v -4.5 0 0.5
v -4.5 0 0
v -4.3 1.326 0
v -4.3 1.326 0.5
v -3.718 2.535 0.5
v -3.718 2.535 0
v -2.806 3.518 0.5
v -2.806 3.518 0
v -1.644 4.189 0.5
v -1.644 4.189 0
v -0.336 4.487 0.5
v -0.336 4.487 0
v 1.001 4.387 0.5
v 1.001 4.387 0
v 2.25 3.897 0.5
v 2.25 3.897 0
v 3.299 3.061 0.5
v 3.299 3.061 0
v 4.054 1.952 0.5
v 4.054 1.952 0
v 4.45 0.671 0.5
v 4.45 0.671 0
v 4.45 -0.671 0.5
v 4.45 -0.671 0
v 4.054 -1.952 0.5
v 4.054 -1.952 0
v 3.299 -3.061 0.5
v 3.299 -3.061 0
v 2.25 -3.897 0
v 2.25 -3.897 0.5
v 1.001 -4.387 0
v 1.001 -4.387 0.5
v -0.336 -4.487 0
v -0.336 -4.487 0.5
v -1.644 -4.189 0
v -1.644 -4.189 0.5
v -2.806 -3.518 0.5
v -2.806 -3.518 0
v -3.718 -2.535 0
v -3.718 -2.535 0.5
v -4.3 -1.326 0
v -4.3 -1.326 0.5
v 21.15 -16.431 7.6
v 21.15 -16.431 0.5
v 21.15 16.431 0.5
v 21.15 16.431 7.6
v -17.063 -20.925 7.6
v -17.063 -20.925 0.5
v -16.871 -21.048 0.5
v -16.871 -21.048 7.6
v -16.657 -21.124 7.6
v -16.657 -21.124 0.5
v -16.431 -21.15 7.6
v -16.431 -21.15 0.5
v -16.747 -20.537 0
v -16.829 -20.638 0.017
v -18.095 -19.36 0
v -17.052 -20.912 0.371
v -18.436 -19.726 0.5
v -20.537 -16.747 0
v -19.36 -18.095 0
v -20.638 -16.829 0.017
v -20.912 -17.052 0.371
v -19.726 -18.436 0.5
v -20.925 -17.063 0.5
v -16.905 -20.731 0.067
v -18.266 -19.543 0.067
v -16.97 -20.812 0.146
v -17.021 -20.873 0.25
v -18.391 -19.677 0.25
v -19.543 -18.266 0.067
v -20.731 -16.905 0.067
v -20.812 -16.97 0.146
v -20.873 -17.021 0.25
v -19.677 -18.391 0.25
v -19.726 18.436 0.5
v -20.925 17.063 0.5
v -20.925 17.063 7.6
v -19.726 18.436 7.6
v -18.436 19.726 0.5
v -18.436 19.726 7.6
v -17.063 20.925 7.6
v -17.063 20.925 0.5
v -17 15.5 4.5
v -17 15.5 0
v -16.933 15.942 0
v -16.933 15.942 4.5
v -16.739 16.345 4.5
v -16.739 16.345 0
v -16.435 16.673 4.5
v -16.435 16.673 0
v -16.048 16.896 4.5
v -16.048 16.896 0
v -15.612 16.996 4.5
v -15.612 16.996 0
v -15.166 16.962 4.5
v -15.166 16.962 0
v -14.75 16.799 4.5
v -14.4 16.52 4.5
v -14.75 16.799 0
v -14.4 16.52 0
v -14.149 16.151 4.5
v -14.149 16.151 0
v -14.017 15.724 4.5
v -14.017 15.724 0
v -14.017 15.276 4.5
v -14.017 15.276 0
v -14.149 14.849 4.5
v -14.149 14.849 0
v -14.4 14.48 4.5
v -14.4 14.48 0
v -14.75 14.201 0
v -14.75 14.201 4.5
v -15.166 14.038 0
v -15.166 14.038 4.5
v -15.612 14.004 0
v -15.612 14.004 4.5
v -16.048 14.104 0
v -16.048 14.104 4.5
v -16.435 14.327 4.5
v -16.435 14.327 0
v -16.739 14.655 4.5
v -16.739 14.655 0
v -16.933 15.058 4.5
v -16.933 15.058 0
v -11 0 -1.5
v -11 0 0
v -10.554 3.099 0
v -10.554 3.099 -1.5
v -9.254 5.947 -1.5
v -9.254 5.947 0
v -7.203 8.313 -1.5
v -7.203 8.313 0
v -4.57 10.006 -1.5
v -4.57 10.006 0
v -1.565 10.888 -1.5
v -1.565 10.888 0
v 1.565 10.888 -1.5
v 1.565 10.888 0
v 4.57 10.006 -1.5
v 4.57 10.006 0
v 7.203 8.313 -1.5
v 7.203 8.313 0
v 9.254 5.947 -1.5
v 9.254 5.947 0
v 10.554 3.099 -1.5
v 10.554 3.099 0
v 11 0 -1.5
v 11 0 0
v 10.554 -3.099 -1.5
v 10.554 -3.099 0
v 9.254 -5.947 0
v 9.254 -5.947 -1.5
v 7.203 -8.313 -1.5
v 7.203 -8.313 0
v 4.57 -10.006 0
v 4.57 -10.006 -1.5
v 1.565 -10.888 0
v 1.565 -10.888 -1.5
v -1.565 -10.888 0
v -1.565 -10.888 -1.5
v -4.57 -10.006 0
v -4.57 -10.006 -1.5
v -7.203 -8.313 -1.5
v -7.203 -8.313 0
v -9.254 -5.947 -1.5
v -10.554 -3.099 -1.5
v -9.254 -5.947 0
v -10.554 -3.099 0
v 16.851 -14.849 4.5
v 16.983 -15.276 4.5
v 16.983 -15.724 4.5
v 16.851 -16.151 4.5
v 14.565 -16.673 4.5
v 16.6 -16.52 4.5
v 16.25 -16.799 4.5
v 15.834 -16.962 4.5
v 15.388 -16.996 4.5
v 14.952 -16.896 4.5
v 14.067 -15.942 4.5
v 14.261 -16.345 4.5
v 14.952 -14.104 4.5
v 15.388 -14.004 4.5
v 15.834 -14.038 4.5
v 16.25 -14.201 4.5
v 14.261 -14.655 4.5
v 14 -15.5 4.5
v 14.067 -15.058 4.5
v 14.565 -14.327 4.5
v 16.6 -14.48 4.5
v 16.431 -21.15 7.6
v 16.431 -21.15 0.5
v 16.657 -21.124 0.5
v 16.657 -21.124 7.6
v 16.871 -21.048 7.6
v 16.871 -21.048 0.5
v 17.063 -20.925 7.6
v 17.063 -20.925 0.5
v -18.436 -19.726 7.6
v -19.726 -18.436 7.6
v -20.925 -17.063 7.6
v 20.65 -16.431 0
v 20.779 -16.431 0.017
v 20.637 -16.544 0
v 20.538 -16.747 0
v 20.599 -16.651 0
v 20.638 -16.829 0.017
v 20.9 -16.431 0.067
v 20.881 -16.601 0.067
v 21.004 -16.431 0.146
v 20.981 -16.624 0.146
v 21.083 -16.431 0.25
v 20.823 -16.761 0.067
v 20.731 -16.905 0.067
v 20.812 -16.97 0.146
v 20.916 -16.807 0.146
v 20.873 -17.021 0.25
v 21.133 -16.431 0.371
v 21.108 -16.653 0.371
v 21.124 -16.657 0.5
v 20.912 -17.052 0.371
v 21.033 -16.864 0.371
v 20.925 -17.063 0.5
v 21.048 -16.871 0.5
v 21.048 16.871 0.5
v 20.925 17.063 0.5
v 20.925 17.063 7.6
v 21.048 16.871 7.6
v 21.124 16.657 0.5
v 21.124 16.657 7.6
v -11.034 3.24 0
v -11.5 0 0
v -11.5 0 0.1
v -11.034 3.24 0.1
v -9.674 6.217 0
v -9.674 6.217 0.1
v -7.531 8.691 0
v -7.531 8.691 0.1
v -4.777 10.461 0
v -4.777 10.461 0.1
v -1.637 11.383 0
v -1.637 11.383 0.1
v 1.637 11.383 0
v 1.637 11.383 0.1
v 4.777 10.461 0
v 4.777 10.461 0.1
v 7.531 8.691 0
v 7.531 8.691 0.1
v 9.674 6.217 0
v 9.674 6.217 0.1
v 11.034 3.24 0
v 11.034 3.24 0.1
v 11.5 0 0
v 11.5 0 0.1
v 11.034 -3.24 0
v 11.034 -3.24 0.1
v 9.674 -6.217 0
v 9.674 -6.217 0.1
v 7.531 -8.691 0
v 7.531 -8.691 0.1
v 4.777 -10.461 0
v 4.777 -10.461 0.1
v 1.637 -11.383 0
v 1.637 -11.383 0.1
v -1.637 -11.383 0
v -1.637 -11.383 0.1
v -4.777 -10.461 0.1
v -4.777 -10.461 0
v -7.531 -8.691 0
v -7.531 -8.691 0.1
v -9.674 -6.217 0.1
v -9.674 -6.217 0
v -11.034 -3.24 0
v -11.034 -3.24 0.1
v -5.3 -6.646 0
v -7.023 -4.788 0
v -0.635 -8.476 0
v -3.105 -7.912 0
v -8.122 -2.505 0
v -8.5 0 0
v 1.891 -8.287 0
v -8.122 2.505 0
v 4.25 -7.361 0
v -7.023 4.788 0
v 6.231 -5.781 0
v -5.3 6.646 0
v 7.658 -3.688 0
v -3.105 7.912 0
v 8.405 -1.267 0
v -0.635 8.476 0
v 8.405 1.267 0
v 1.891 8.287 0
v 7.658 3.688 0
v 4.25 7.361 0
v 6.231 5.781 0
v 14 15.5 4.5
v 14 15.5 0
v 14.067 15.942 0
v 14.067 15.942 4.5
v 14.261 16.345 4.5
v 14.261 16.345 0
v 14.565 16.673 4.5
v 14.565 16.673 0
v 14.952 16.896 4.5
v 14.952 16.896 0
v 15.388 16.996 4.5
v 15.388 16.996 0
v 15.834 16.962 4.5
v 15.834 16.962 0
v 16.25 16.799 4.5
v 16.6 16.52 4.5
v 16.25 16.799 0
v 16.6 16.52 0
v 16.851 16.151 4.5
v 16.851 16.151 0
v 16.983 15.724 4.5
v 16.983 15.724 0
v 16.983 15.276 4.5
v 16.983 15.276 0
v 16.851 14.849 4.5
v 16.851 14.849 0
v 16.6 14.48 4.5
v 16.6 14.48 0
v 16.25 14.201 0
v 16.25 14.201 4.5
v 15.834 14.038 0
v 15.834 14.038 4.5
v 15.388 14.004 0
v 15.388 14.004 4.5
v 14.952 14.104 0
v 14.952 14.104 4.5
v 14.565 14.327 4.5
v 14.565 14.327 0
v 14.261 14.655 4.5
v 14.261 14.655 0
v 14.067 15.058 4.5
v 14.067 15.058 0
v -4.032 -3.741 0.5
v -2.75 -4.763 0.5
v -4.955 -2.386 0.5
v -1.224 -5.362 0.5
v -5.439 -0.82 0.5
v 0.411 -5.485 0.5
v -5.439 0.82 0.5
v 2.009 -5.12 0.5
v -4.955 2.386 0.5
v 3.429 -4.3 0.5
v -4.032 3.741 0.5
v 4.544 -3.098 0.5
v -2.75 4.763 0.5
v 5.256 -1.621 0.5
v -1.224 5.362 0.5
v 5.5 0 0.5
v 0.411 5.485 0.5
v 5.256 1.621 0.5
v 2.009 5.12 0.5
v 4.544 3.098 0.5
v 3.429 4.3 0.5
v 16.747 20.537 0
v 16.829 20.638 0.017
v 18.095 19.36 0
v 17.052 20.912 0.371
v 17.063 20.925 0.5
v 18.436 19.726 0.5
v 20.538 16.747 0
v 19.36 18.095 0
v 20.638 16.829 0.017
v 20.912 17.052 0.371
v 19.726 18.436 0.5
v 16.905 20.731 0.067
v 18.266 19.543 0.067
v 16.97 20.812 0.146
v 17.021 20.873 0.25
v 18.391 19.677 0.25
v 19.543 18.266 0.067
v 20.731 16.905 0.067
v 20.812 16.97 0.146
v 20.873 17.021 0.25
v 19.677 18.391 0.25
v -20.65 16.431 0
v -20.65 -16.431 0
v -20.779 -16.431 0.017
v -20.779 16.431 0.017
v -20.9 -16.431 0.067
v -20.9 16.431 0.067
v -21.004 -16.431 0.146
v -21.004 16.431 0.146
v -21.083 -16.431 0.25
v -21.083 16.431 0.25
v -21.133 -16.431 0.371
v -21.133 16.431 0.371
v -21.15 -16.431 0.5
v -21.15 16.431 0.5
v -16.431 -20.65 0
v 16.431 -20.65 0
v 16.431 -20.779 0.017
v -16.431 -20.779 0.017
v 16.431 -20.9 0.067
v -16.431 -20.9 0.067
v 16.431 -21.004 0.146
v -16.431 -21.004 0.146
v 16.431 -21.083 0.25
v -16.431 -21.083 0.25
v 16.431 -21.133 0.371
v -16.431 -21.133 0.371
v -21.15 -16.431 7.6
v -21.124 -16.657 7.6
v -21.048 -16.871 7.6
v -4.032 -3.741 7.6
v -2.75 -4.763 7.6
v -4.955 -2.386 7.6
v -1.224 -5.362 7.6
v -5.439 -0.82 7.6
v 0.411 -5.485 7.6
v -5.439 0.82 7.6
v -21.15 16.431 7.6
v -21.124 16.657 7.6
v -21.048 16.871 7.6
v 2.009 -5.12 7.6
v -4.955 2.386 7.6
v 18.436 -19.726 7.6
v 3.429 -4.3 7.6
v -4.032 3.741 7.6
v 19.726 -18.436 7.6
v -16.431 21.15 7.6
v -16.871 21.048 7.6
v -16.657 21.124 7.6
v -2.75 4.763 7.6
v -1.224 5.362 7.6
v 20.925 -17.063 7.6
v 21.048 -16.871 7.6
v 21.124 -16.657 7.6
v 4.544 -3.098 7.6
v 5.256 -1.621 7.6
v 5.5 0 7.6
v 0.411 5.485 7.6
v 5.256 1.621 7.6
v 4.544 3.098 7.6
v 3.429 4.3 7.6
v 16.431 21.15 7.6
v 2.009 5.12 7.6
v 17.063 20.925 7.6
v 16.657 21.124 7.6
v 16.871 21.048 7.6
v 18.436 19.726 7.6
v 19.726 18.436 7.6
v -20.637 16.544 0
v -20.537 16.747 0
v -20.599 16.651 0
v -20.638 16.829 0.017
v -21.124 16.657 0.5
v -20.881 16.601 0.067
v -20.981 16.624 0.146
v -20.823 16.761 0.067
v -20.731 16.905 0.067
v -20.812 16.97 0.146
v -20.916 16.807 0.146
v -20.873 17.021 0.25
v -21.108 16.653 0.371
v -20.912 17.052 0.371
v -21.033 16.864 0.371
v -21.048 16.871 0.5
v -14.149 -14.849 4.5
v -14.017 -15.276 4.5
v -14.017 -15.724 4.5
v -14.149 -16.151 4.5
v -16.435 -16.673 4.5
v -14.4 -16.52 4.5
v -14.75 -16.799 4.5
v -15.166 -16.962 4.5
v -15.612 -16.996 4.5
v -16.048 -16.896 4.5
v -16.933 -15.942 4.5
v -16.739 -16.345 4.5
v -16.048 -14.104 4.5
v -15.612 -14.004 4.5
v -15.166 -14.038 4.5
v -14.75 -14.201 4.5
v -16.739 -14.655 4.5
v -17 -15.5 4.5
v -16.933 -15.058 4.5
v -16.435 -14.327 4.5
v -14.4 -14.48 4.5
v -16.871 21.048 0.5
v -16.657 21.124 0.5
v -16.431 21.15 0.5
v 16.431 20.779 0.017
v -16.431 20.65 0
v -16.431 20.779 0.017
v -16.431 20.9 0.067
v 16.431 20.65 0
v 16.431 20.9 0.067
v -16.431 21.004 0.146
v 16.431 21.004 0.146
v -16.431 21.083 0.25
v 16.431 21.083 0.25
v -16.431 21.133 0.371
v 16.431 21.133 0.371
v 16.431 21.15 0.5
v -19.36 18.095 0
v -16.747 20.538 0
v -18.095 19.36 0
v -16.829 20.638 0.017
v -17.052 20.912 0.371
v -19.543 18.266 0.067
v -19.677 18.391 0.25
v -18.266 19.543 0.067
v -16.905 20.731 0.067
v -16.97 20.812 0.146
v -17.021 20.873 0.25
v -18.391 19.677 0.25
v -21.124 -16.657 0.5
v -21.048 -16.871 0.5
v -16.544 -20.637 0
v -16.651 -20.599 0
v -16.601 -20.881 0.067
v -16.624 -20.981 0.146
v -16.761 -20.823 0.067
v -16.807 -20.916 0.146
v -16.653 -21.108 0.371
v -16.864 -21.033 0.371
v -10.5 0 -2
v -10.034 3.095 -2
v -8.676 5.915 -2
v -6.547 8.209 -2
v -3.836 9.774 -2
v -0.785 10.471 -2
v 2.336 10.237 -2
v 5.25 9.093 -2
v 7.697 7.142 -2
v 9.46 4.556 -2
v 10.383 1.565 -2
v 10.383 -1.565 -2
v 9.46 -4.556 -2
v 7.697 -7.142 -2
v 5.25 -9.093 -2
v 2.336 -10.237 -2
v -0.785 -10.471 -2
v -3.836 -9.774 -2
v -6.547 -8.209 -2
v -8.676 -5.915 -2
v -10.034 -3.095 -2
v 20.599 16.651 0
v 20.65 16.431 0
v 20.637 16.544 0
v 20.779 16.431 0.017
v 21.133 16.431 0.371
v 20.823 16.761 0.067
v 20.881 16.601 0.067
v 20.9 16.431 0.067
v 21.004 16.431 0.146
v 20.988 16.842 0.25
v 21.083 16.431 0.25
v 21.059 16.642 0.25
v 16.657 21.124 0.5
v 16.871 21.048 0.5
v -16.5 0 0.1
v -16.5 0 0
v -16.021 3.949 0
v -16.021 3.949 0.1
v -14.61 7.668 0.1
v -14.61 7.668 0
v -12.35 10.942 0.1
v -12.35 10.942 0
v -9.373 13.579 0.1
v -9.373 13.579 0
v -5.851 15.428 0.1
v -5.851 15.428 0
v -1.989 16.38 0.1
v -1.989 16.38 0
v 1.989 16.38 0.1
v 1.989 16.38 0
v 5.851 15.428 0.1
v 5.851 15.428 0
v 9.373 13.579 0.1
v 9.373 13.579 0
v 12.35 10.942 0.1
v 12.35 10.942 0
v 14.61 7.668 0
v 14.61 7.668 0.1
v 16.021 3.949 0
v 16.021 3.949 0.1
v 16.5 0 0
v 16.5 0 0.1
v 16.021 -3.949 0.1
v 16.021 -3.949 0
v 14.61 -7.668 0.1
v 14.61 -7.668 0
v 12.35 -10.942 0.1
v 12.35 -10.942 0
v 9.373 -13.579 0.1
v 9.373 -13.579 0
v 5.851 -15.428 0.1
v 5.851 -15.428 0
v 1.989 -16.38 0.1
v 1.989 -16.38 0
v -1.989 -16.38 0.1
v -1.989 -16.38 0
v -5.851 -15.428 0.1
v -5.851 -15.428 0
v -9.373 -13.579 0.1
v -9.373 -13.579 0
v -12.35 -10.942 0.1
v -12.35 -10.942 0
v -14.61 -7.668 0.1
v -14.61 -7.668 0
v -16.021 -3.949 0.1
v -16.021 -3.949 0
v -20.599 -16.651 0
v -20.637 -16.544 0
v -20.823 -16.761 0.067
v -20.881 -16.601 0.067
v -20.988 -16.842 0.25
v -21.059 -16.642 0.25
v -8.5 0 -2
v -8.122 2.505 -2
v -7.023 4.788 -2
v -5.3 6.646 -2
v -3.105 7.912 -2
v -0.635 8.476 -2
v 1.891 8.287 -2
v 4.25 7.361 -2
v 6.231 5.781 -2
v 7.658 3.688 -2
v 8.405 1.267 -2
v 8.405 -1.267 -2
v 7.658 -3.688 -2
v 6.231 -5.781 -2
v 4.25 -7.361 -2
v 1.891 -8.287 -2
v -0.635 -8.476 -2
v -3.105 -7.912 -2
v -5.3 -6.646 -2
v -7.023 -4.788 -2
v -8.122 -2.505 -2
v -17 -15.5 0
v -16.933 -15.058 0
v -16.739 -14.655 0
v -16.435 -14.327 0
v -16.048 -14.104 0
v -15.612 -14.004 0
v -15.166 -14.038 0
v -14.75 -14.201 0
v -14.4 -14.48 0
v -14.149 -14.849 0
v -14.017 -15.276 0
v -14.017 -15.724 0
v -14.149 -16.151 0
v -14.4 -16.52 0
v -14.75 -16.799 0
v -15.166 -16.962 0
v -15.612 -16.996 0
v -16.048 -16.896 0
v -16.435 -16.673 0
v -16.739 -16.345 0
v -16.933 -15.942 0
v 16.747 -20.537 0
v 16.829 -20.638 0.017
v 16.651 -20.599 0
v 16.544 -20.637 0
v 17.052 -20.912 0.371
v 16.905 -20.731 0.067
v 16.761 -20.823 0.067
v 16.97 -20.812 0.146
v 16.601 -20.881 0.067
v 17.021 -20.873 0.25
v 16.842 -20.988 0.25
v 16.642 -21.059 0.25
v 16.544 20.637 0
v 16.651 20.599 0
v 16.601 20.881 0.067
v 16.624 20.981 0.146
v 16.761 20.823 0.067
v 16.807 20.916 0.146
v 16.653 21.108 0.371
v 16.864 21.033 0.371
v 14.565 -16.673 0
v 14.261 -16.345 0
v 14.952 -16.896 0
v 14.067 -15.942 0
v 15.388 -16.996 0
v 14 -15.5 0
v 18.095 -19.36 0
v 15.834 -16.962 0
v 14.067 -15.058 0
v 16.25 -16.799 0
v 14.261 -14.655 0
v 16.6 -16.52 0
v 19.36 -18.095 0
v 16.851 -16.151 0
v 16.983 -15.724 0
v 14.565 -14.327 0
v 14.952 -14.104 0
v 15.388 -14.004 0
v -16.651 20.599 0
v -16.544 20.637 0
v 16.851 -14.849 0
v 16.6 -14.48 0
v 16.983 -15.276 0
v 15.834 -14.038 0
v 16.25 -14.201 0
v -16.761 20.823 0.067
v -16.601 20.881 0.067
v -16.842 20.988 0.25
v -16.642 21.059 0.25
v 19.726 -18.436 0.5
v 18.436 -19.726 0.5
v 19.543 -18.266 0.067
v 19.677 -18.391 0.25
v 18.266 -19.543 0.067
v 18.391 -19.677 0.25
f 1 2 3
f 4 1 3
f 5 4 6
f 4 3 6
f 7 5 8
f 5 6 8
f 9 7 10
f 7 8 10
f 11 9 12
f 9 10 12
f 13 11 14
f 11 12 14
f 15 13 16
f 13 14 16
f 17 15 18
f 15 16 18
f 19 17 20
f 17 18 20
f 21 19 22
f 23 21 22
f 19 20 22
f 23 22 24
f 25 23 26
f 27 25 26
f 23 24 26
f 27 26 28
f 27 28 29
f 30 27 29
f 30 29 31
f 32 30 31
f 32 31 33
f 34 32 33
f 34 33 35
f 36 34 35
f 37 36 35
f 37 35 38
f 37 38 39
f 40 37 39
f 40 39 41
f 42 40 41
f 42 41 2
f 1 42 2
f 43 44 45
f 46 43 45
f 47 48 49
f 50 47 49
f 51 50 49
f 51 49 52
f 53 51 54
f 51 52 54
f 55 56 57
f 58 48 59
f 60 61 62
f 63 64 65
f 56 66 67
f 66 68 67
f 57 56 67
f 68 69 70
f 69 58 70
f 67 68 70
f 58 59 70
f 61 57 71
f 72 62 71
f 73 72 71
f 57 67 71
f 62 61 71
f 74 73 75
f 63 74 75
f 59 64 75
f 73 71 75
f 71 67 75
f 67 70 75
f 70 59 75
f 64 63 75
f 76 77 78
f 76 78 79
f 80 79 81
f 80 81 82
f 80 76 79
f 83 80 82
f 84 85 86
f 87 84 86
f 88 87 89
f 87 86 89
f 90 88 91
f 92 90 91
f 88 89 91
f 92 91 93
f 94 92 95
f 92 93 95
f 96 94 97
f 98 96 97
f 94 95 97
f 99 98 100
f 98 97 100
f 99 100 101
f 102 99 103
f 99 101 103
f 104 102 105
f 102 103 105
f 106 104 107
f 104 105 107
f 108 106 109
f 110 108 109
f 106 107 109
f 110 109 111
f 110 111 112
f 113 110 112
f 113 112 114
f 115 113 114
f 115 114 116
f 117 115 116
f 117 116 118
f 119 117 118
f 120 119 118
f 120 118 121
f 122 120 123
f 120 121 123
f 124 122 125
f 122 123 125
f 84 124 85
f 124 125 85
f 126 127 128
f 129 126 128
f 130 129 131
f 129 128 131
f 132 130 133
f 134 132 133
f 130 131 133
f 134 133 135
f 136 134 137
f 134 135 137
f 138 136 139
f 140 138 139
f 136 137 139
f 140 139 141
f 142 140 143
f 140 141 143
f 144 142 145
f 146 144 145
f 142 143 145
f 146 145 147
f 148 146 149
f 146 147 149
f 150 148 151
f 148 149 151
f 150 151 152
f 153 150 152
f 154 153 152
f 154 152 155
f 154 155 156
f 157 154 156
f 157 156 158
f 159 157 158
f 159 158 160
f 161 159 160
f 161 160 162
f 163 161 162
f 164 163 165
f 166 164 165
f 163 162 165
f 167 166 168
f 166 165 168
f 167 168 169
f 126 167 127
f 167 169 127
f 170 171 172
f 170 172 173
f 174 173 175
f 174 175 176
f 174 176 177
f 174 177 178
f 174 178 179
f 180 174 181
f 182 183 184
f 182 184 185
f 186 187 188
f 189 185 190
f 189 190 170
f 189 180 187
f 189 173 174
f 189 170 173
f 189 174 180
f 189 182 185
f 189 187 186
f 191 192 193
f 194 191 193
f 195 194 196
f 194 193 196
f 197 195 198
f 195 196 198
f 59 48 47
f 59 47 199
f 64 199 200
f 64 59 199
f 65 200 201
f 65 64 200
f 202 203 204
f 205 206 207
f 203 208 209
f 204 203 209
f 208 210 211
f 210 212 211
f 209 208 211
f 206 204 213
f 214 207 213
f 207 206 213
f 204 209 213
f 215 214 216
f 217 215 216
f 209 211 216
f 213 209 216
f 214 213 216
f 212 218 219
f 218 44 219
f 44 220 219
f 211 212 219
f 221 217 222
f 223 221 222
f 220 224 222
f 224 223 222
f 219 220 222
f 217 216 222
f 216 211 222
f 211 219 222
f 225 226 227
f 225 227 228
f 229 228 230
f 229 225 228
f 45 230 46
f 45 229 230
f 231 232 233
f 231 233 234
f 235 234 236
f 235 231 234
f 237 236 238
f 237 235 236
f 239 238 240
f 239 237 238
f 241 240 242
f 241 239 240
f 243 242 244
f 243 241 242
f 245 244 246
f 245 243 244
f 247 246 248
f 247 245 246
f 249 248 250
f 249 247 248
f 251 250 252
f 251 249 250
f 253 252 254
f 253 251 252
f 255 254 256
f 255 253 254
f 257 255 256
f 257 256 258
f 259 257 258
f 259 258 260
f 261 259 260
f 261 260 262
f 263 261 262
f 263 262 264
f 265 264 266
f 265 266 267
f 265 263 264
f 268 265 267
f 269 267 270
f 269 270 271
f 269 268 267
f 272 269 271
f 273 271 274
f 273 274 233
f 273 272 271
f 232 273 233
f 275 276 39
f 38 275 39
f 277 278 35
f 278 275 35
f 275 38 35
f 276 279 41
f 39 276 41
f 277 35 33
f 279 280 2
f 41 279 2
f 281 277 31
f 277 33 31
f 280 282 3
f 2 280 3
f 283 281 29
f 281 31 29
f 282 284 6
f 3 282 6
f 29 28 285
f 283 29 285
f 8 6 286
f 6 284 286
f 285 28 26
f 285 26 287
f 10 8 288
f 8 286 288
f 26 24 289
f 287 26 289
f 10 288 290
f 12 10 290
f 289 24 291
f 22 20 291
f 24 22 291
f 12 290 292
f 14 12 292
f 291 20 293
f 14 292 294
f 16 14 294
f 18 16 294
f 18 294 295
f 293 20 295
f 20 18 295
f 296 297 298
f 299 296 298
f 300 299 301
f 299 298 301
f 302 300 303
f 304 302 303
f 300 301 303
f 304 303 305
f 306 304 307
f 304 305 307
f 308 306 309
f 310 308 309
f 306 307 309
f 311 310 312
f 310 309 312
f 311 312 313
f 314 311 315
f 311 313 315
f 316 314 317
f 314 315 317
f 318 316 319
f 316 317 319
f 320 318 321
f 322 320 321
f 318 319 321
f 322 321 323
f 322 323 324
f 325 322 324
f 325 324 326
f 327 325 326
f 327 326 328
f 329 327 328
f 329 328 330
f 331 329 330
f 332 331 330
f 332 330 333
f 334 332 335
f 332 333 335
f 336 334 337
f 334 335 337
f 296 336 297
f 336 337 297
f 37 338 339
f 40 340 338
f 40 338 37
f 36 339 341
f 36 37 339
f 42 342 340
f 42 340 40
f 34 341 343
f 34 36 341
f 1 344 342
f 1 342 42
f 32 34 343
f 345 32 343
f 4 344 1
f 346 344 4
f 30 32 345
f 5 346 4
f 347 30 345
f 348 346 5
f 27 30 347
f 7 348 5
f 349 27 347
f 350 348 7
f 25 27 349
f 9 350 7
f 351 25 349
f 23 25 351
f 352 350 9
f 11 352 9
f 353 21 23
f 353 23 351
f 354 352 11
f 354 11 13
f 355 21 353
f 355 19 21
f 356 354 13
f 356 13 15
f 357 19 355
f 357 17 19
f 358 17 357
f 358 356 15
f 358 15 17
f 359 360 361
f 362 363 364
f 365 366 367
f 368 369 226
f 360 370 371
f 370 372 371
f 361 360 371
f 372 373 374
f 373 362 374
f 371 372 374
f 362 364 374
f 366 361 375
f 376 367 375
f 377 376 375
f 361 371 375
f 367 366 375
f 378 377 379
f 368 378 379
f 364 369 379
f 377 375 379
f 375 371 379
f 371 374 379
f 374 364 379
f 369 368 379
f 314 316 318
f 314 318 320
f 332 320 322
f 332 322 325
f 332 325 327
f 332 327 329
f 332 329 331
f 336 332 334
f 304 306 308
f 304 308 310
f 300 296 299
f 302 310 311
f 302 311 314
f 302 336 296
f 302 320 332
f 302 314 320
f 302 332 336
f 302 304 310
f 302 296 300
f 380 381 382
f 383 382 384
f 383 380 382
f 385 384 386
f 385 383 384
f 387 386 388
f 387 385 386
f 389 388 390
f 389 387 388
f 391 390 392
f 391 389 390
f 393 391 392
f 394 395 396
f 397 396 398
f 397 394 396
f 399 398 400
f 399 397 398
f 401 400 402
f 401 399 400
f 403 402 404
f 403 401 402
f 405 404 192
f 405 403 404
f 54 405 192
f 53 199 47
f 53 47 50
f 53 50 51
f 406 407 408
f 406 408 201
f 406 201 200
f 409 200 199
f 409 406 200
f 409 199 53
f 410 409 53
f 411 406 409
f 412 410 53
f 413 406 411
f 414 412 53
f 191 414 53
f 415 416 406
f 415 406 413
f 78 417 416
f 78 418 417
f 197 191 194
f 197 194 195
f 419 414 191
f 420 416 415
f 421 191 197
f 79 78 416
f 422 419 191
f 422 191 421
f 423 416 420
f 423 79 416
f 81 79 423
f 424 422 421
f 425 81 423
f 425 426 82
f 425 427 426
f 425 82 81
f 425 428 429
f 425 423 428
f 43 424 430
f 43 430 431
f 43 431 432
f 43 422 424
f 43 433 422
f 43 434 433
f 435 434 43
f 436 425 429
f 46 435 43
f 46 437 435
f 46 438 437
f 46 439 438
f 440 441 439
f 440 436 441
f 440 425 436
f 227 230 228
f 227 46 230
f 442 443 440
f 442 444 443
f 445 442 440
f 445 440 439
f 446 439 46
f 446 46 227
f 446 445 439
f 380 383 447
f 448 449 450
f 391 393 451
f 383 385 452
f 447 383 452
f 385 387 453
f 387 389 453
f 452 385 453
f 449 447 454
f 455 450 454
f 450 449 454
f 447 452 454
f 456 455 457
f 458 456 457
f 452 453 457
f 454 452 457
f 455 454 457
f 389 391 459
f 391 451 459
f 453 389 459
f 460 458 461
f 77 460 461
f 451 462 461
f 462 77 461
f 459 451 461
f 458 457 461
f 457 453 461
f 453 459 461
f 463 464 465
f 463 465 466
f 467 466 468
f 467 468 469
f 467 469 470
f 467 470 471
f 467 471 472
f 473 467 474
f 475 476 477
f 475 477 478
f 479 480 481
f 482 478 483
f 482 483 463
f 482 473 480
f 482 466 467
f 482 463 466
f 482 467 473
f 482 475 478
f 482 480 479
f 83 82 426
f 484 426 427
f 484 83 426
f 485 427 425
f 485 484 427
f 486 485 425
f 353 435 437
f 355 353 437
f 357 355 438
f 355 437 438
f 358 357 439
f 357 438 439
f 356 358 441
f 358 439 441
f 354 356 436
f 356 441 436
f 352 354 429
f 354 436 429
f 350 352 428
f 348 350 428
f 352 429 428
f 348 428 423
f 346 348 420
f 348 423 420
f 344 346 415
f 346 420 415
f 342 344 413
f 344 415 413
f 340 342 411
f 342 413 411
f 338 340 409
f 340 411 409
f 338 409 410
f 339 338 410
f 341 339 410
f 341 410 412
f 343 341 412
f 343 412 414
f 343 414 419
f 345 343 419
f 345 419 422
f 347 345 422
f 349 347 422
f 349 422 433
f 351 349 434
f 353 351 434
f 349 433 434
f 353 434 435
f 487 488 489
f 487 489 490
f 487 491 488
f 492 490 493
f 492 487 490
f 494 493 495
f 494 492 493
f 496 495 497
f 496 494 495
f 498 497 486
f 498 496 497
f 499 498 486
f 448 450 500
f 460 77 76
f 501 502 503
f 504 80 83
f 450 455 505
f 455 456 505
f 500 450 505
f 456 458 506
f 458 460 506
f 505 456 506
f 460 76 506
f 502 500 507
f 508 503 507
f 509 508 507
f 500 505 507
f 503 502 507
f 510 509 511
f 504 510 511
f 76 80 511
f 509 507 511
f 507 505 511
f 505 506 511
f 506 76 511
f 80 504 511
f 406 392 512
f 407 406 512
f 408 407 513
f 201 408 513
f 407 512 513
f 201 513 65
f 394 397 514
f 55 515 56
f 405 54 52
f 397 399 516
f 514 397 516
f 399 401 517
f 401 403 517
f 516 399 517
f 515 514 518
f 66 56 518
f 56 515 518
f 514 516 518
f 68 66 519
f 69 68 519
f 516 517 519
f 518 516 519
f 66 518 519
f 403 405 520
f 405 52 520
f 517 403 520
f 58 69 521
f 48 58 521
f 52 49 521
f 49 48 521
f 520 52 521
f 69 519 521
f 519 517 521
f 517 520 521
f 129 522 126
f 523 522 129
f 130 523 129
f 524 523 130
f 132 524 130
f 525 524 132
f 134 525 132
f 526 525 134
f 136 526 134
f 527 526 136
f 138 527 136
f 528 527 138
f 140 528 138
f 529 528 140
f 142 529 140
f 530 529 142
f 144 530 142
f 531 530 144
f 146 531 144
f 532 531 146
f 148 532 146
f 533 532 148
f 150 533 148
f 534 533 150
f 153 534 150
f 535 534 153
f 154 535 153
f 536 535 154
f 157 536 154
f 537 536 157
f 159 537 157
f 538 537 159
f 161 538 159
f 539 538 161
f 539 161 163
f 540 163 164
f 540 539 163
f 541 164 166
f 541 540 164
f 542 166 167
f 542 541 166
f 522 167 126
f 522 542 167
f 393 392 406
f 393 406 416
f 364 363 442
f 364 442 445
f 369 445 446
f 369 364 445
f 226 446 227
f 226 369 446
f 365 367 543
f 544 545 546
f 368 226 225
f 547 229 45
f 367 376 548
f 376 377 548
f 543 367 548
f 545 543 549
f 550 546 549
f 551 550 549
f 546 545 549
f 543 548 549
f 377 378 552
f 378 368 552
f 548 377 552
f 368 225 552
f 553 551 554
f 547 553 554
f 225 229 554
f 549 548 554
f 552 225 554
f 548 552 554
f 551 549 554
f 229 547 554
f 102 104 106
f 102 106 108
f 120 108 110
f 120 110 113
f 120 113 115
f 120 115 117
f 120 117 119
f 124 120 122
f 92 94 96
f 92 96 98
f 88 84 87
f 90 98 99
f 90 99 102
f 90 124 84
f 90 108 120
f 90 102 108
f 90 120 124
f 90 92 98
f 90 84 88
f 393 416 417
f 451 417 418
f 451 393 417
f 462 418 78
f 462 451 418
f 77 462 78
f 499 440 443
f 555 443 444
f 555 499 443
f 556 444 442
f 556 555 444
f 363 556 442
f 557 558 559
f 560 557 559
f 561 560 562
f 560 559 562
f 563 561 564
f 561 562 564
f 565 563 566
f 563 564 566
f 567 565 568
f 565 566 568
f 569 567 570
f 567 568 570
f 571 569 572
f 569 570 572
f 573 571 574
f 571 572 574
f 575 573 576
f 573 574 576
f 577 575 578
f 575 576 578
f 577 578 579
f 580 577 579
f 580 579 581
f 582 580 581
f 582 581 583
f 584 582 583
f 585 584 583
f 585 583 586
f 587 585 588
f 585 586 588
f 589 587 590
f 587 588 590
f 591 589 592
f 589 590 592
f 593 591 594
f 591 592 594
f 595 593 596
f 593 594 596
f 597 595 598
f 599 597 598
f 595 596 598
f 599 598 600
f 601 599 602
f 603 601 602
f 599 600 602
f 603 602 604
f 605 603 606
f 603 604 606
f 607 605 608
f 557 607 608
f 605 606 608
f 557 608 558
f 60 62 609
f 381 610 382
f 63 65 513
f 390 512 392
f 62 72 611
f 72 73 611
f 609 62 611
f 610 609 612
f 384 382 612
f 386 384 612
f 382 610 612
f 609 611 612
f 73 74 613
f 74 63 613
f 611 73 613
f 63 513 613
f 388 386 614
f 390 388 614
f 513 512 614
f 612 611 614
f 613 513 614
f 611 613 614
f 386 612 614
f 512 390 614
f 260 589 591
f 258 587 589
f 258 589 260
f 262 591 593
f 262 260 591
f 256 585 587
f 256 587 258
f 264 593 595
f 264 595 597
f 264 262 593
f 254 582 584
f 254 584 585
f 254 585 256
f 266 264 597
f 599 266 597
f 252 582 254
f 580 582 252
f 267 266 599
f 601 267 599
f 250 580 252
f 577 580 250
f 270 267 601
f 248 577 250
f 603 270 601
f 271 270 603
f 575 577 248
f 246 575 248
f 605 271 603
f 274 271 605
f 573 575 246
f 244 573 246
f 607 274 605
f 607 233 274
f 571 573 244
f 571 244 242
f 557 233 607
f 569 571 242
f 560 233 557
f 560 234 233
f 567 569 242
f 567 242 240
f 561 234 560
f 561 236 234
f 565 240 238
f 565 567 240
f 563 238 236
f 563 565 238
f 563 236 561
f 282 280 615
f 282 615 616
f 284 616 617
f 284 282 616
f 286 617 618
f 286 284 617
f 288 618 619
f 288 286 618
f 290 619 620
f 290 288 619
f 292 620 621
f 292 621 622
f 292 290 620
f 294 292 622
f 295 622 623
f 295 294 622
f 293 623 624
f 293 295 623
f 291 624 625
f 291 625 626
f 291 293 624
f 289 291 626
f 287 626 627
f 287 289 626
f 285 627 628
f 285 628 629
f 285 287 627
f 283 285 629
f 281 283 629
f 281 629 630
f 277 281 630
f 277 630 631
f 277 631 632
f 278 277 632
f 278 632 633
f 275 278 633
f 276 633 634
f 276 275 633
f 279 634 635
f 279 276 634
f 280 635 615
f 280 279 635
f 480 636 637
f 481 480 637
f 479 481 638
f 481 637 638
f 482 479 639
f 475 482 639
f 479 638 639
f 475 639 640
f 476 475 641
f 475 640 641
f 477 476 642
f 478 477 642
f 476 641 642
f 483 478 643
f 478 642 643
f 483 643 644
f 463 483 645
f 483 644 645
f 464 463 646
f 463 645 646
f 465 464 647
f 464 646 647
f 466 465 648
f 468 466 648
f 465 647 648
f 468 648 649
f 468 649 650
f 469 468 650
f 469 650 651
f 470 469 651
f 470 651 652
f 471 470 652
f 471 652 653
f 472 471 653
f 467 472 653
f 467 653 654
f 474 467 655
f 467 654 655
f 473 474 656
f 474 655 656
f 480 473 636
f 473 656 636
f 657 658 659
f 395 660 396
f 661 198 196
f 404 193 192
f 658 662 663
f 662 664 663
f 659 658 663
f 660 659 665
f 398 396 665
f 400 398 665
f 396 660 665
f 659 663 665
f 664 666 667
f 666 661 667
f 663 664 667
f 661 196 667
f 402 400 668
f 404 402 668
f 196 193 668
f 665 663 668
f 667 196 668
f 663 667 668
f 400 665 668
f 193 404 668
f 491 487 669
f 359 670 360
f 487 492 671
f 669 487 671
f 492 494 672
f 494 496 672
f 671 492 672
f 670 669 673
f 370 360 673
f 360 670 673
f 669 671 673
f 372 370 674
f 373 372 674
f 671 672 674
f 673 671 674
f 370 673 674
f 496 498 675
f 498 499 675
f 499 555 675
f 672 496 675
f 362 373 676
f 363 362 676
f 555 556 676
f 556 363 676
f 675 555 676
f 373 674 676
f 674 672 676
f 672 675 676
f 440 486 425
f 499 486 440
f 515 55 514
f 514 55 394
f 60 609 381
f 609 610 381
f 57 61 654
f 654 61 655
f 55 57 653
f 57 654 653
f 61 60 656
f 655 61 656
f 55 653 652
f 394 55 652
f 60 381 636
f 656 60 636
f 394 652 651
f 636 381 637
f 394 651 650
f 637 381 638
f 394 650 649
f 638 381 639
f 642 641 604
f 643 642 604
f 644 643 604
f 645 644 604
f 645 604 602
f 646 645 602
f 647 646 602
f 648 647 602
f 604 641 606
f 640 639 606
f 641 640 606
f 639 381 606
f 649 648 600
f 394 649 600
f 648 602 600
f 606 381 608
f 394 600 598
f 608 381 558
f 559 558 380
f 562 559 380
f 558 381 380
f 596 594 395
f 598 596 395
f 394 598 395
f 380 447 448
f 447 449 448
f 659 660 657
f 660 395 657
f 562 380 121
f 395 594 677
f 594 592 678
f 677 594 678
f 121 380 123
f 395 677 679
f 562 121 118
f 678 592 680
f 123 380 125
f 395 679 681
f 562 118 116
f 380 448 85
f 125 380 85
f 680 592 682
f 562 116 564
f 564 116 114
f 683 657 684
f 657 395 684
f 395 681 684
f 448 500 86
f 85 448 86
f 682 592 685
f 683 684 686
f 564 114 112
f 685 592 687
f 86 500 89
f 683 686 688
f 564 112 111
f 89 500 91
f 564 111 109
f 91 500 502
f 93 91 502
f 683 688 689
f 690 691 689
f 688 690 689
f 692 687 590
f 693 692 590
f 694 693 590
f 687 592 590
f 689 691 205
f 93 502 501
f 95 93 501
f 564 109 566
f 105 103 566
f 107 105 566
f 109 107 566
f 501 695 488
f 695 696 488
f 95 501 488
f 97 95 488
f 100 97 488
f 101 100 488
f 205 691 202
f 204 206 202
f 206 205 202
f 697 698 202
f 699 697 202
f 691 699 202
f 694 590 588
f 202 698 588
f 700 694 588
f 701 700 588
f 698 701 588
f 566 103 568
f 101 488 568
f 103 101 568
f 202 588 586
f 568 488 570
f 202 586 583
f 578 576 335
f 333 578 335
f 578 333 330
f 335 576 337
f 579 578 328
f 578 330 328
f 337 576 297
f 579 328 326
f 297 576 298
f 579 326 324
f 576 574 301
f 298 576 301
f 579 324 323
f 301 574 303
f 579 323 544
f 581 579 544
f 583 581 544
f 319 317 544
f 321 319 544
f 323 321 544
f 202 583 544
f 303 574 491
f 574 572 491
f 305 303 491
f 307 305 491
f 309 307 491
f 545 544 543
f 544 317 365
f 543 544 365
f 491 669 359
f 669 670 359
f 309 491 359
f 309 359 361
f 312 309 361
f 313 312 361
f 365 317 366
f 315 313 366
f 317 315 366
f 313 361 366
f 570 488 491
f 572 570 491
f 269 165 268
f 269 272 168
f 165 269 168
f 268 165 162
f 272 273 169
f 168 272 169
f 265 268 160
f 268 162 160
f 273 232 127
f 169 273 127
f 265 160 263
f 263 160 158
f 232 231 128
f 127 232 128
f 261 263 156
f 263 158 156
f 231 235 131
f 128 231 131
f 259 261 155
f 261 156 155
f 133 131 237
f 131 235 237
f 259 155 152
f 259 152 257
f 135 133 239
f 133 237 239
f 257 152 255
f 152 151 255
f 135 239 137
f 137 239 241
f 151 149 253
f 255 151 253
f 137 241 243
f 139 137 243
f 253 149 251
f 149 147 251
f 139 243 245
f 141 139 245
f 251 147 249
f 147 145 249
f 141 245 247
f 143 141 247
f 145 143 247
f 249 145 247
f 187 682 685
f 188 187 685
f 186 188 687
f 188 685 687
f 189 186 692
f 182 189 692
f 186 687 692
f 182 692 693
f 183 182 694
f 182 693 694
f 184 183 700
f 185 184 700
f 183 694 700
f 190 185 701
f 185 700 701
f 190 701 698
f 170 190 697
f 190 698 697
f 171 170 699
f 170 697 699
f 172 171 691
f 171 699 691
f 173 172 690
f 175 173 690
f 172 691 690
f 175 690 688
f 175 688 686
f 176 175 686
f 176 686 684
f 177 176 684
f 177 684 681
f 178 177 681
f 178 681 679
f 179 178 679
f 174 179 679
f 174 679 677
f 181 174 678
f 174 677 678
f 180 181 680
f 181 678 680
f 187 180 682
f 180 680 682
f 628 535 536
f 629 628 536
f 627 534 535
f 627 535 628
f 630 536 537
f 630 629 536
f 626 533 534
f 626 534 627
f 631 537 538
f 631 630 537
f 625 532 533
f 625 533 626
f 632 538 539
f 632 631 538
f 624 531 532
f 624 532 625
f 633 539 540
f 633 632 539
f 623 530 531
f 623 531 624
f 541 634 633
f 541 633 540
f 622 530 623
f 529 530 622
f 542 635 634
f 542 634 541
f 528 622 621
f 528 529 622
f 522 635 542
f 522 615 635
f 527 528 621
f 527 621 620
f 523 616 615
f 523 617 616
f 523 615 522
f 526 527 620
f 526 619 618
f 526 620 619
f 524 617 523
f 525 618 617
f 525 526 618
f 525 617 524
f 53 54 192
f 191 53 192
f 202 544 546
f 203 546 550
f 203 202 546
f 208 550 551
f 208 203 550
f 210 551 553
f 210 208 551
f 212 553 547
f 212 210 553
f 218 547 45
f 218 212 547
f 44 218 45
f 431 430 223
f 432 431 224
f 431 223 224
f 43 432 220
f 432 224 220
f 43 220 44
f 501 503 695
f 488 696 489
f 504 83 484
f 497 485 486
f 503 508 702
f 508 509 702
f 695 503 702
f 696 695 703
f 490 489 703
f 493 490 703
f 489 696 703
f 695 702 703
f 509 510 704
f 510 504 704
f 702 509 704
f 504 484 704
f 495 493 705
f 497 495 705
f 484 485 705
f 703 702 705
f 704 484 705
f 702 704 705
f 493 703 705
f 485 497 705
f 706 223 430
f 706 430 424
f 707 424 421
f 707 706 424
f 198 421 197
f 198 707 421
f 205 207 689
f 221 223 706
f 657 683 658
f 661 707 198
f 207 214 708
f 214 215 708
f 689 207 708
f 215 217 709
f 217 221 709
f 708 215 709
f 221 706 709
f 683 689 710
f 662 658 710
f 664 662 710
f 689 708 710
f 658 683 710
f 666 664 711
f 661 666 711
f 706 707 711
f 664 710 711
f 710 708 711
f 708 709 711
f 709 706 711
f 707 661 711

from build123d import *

# Parameters (mm, degrees)
CROQUIS1_W              = 42.3
CROQUIS1_H              = 42.3
SALIENTE_EXTRUIR1_DEPTH = 7.6
SKETCH1_R               = 29.910616844
SKETCH1_R_2             = 27
CUT_EXTRUDE1_DEPTH      = 8.6
CROQUIS3_R              = 11
CROQUIS3_R_2            = 8.5
SALIENTE_EXTRUIR2_DEPTH = 2
CROQUIS4_R              = 4.5
CORTAR_EXTRUIR2_DEPTH   = 7
CROQUIS5_R              = 2.5
CORTAR_EXTRUIR3_DEPTH   = 7
CROQUIS6_R              = 1.5
CORTAR_EXTRUIR4_DEPTH   = 4.5
SKETCH2_R               = 5.5
CUT_EXTRUDE2_DEPTH      = 7.1
SKETCH3_R               = 16.5
SKETCH3_R_2             = 11.5
CUT_EXTRUDE3_DEPTH      = 0.1
FILLET1_R               = 1
FILLET2_R               = 0.5
CHAMFER1_SIZE           = 0.5


with BuildPart() as part:
    # Croquis1 → Saliente-Extruir1 (new body)
    with BuildSketch(Plane.XY):
        Rectangle(CROQUIS1_W, CROQUIS1_H)
    extrude(amount=SALIENTE_EXTRUIR1_DEPTH)

    # Sketch1 → Cut-Extrude1 (cut, through all)
    with BuildSketch(Plane(origin=(0, 0, 0), x_dir=(-1, 0, 0), z_dir=(0, 0, -1))):
        Circle(SKETCH1_R)
        Circle(SKETCH1_R_2, mode=Mode.SUBTRACT)
    extrude(amount=-CUT_EXTRUDE1_DEPTH, mode=Mode.SUBTRACT)

    # Croquis3 → Saliente-Extruir2 (add)
    with BuildSketch(Plane(origin=(0, 0, 0), x_dir=(-1, 0, 0), z_dir=(0, 0, -1))):
        Circle(CROQUIS3_R)
        Circle(CROQUIS3_R_2, mode=Mode.SUBTRACT)
    extrude(amount=SALIENTE_EXTRUIR2_DEPTH)

    # Croquis4 → Cortar-Extruir2 (cut)
    with BuildSketch(Plane(origin=(0, 0, -2), x_dir=(-1, 0, 0), z_dir=(0, 0, -1))):
        Circle(CROQUIS4_R)
    extrude(amount=-CORTAR_EXTRUIR2_DEPTH, mode=Mode.SUBTRACT)

    # Croquis5 → Cortar-Extruir3 (cut)
    with BuildSketch(Plane(origin=(0, 0, 5), x_dir=(-1, 0, 0), z_dir=(0, 0, -1))):
        Circle(CROQUIS5_R)
    extrude(amount=-CORTAR_EXTRUIR3_DEPTH, mode=Mode.SUBTRACT)

    # Croquis6 → Cortar-Extruir4 (cut)
    with BuildSketch(Plane(origin=(0, 0, 0), x_dir=(-1, 0, 0), z_dir=(0, 0, -1))):
        with Locations((-15.5, 15.5)):
            Circle(CROQUIS6_R)
        with Locations((15.5, 15.5)):
            Circle(CROQUIS6_R)
        with Locations((15.5, -15.5)):
            Circle(CROQUIS6_R)
        with Locations((-15.5, -15.5)):
            Circle(CROQUIS6_R)
    extrude(amount=-CORTAR_EXTRUIR4_DEPTH, mode=Mode.SUBTRACT)

    # Sketch2 → Cut-Extrude2 (cut)
    with BuildSketch(Plane.XY.offset(7.6)):
        Circle(SKETCH2_R)
    extrude(amount=-CUT_EXTRUDE2_DEPTH, mode=Mode.SUBTRACT)

    # Sketch3 → Cut-Extrude3 (cut)
    with BuildSketch(Plane(origin=(0, 0, 0), x_dir=(-1, 0, 0), z_dir=(0, 0, -1))):
        Circle(SKETCH3_R)
        Circle(SKETCH3_R_2, mode=Mode.SUBTRACT)
    extrude(amount=-CUT_EXTRUDE3_DEPTH, mode=Mode.SUBTRACT)

    # Fillet1
    fillet1_edges = [part.edges().sort_by_distance(p)[0] for p in [
        (21.15, 16.783250579, 3.8),
        (21.15, -16.783250579, 3.8),
        (-16.783250579, 21.15, 3.8),
        (16.783250579, 21.15, 3.8),
        (-21.15, -16.783250579, 3.8),
        (-21.15, 16.783250579, 3.8),
        (16.783250579, -21.15, 3.8),
        (-16.783250579, -21.15, 3.8),
    ]]
    fillet(fillet1_edges, radius=FILLET1_R)

    # Fillet2
    fillet2_edges = [part.edges().sort_by_distance(p)[0] for p in [
        (19.091883092, 19.091883092, 0),
        (0, 21.15, 0),
        (-21.15, 0, 0),
        (-19.091883092, 19.091883092, 0),
        (21.15, 0, 0),
        (19.091883092, -19.091883092, 0),
        (0, -21.15, 0),
        (-19.091883092, -19.091883092, 0),
        (-16.766402254, 21.092072184, 0),
        (-21.092072184, 16.766402254, 0),
        (-21.092072184, -16.766402254, 0),
        (-16.766402254, -21.092072184, 0),
        (16.766402254, -21.092072184, 0),
        (21.092072184, -16.766402254, 0),
        (21.092072184, 16.766402254, 0),
        (16.766402254, 21.092072184, 0),
    ]]
    fillet(fillet2_edges, radius=FILLET2_R)

    # Chamfer1
    chamfer1_edges = [part.edges().sort_by_distance(p)[0] for p in [
        (11, 0, -2),
    ]]
    chamfer(chamfer1_edges, length=CHAMFER1_SIZE)


solid = part.part
